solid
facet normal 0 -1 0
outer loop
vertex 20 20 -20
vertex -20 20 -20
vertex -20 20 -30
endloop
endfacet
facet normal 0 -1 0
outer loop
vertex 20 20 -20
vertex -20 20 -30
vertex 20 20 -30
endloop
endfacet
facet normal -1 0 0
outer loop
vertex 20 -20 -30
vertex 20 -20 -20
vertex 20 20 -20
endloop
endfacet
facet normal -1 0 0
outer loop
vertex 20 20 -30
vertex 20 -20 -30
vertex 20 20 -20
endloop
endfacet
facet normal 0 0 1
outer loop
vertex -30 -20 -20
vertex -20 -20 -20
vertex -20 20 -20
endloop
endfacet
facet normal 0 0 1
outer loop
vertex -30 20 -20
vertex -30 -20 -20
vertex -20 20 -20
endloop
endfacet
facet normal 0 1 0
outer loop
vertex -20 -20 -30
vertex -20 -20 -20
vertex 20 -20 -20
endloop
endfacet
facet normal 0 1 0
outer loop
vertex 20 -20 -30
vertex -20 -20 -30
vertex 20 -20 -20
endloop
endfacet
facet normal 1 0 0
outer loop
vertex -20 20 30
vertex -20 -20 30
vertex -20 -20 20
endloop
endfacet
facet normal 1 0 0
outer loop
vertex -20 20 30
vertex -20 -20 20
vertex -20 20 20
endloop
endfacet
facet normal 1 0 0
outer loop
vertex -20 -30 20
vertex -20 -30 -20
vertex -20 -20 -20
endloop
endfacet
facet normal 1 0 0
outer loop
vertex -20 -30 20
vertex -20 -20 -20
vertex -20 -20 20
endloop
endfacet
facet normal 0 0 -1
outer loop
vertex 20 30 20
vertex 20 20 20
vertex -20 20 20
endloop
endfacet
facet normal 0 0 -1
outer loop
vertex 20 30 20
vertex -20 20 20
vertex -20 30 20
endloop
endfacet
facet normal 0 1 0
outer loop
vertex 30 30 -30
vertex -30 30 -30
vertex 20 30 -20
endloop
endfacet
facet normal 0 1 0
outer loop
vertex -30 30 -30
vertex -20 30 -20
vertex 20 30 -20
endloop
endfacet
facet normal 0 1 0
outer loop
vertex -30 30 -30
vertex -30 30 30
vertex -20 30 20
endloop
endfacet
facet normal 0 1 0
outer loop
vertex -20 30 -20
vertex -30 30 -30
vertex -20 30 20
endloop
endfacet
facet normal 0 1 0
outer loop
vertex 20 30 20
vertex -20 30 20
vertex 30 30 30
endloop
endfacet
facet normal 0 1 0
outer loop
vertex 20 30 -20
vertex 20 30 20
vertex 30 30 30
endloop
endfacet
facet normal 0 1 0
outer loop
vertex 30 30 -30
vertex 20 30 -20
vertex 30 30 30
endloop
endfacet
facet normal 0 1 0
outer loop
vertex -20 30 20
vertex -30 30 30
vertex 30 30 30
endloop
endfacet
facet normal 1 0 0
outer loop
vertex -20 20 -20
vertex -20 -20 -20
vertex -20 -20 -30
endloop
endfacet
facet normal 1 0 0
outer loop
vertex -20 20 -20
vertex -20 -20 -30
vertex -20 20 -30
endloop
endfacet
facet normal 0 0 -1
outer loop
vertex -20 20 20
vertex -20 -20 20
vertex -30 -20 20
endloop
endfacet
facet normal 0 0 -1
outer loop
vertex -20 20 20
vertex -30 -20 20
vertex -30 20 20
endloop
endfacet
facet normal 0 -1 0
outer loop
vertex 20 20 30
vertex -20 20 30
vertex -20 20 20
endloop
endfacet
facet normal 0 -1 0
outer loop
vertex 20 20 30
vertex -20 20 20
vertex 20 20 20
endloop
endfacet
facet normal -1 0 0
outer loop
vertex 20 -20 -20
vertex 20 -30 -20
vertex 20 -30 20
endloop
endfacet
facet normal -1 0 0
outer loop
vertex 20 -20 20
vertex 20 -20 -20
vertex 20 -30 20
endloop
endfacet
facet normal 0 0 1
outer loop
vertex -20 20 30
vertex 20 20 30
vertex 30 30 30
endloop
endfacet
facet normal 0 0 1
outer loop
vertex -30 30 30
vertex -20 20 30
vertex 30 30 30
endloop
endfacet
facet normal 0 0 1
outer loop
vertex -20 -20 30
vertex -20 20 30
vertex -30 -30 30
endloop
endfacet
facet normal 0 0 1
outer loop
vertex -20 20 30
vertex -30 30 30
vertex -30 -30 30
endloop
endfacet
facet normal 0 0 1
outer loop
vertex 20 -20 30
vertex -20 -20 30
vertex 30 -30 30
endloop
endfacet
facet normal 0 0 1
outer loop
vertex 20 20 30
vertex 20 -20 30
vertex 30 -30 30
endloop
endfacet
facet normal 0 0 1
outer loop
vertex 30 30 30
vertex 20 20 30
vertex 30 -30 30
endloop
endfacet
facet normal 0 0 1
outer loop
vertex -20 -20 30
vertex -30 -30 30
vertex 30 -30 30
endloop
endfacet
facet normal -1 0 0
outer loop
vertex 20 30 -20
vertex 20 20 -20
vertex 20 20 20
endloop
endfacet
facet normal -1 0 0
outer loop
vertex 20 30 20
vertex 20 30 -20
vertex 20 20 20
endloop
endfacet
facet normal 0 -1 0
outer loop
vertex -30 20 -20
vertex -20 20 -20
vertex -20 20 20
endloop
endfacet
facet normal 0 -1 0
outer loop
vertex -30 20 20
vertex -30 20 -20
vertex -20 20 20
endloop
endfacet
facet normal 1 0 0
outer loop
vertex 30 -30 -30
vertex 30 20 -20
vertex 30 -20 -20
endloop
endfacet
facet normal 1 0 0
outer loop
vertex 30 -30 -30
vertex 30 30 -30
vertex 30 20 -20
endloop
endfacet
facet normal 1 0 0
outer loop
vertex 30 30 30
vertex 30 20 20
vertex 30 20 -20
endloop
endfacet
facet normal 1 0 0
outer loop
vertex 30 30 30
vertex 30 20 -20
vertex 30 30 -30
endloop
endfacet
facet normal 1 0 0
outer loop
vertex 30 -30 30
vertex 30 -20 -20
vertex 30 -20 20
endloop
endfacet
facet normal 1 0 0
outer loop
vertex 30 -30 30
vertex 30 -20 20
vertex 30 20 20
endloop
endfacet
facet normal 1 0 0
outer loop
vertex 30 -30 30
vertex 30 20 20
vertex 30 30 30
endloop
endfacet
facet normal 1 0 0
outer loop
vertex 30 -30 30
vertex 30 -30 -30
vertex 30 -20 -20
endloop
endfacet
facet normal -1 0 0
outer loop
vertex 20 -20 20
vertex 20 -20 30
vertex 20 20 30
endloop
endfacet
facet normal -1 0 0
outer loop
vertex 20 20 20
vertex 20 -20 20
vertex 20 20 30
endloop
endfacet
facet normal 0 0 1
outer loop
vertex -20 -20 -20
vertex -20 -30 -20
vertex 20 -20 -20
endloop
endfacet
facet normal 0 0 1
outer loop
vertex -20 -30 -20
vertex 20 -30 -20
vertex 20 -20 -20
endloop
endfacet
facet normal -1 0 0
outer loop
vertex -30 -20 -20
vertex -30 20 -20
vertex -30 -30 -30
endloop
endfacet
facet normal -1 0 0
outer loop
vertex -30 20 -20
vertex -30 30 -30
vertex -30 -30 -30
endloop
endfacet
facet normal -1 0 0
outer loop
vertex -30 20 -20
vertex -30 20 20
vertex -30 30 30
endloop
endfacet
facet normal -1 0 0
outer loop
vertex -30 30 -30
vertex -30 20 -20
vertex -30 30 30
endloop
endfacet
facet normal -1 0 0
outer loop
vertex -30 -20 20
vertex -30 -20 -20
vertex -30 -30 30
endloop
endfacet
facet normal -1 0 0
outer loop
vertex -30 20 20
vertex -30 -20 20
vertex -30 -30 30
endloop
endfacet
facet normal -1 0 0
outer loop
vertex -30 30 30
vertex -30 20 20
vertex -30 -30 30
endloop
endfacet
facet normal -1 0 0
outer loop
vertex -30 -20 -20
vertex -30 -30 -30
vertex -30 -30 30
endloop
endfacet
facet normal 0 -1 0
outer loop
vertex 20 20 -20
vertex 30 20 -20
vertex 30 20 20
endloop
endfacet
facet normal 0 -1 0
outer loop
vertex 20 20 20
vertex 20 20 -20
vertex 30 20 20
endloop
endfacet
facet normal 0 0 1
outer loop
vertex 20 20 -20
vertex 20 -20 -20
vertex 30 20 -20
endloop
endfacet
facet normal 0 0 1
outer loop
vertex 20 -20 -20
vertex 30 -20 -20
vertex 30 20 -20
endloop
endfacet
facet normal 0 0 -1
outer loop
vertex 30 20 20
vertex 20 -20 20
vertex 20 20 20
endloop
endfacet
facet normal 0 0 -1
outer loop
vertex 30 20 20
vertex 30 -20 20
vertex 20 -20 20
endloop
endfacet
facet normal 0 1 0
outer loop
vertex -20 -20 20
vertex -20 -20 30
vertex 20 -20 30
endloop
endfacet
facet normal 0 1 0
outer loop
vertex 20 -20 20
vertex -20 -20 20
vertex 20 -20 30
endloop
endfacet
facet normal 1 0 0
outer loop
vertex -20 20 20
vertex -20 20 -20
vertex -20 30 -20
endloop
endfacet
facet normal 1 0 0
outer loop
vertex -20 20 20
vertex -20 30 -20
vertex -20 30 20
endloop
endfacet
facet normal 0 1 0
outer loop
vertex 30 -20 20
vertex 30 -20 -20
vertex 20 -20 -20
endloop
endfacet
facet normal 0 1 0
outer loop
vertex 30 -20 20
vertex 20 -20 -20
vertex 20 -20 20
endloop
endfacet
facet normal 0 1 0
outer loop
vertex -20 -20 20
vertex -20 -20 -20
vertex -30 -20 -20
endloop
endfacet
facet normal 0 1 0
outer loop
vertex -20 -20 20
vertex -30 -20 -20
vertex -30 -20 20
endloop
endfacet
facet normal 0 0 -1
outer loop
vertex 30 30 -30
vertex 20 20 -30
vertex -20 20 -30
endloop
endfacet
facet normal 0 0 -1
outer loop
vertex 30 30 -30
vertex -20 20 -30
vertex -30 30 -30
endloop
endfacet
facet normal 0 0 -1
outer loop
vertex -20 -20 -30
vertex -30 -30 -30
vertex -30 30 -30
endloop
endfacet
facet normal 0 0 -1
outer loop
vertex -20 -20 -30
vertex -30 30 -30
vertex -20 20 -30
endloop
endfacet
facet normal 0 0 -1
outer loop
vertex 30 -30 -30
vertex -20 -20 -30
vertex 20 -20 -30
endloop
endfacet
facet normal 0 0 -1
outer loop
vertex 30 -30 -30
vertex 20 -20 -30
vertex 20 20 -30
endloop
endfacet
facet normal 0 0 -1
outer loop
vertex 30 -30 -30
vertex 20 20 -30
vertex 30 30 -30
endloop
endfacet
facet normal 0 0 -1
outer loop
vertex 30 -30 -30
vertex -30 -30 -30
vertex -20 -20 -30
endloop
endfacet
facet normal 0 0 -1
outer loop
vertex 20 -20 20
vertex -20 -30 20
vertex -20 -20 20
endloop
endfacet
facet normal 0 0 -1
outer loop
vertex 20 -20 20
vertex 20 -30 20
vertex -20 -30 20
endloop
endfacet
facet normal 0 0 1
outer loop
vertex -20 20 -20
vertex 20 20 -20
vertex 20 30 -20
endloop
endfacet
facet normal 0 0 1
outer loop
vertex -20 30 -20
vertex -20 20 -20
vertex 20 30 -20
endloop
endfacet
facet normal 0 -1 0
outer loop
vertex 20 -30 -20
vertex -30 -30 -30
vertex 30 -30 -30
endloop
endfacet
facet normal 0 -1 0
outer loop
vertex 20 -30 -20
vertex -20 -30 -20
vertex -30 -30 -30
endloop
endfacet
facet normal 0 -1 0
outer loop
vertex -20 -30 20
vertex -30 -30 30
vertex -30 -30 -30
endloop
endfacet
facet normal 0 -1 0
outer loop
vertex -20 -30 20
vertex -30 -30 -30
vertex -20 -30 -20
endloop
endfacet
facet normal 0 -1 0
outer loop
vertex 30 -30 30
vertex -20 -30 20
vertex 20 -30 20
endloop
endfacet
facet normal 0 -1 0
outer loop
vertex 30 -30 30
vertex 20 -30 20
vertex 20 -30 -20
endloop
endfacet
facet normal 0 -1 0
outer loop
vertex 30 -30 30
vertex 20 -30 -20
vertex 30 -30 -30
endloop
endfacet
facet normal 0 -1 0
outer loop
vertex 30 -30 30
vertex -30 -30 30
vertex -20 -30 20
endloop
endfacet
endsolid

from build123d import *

# Parameters (mm, degrees)
F0_W     = 60
F0_H     = 60
F0_W_2   = 40
F0_H_2   = 40
F1_DEPTH = 30
F2_W     = 40
F2_H     = 40
F3_DEPTH = 60.001
F4_W     = 40
F4_H     = 40
F5_DEPTH = 60.001


with BuildPart() as f1:
    # F0 (on Front) → F1 (new body, symmetric)
    with BuildSketch(Plane.XZ):
        Rectangle(F0_W, F0_H)
        Rectangle(F0_W_2, F0_H_2, mode=Mode.SUBTRACT)
    extrude(amount=F1_DEPTH, both=True)

    # F2 (on face) → F3 (cut, through all)
    with BuildSketch(Plane.YZ.offset(30)):
        Rectangle(F2_W, F2_H)
    extrude(amount=-F3_DEPTH, mode=Mode.SUBTRACT)

    # F4 (on face) → F5 (cut, through all)
    with BuildSketch(Plane.XY.offset(30)):
        Rectangle(F4_W, F4_H)
    extrude(amount=-F5_DEPTH, mode=Mode.SUBTRACT)


solid = f1.part
